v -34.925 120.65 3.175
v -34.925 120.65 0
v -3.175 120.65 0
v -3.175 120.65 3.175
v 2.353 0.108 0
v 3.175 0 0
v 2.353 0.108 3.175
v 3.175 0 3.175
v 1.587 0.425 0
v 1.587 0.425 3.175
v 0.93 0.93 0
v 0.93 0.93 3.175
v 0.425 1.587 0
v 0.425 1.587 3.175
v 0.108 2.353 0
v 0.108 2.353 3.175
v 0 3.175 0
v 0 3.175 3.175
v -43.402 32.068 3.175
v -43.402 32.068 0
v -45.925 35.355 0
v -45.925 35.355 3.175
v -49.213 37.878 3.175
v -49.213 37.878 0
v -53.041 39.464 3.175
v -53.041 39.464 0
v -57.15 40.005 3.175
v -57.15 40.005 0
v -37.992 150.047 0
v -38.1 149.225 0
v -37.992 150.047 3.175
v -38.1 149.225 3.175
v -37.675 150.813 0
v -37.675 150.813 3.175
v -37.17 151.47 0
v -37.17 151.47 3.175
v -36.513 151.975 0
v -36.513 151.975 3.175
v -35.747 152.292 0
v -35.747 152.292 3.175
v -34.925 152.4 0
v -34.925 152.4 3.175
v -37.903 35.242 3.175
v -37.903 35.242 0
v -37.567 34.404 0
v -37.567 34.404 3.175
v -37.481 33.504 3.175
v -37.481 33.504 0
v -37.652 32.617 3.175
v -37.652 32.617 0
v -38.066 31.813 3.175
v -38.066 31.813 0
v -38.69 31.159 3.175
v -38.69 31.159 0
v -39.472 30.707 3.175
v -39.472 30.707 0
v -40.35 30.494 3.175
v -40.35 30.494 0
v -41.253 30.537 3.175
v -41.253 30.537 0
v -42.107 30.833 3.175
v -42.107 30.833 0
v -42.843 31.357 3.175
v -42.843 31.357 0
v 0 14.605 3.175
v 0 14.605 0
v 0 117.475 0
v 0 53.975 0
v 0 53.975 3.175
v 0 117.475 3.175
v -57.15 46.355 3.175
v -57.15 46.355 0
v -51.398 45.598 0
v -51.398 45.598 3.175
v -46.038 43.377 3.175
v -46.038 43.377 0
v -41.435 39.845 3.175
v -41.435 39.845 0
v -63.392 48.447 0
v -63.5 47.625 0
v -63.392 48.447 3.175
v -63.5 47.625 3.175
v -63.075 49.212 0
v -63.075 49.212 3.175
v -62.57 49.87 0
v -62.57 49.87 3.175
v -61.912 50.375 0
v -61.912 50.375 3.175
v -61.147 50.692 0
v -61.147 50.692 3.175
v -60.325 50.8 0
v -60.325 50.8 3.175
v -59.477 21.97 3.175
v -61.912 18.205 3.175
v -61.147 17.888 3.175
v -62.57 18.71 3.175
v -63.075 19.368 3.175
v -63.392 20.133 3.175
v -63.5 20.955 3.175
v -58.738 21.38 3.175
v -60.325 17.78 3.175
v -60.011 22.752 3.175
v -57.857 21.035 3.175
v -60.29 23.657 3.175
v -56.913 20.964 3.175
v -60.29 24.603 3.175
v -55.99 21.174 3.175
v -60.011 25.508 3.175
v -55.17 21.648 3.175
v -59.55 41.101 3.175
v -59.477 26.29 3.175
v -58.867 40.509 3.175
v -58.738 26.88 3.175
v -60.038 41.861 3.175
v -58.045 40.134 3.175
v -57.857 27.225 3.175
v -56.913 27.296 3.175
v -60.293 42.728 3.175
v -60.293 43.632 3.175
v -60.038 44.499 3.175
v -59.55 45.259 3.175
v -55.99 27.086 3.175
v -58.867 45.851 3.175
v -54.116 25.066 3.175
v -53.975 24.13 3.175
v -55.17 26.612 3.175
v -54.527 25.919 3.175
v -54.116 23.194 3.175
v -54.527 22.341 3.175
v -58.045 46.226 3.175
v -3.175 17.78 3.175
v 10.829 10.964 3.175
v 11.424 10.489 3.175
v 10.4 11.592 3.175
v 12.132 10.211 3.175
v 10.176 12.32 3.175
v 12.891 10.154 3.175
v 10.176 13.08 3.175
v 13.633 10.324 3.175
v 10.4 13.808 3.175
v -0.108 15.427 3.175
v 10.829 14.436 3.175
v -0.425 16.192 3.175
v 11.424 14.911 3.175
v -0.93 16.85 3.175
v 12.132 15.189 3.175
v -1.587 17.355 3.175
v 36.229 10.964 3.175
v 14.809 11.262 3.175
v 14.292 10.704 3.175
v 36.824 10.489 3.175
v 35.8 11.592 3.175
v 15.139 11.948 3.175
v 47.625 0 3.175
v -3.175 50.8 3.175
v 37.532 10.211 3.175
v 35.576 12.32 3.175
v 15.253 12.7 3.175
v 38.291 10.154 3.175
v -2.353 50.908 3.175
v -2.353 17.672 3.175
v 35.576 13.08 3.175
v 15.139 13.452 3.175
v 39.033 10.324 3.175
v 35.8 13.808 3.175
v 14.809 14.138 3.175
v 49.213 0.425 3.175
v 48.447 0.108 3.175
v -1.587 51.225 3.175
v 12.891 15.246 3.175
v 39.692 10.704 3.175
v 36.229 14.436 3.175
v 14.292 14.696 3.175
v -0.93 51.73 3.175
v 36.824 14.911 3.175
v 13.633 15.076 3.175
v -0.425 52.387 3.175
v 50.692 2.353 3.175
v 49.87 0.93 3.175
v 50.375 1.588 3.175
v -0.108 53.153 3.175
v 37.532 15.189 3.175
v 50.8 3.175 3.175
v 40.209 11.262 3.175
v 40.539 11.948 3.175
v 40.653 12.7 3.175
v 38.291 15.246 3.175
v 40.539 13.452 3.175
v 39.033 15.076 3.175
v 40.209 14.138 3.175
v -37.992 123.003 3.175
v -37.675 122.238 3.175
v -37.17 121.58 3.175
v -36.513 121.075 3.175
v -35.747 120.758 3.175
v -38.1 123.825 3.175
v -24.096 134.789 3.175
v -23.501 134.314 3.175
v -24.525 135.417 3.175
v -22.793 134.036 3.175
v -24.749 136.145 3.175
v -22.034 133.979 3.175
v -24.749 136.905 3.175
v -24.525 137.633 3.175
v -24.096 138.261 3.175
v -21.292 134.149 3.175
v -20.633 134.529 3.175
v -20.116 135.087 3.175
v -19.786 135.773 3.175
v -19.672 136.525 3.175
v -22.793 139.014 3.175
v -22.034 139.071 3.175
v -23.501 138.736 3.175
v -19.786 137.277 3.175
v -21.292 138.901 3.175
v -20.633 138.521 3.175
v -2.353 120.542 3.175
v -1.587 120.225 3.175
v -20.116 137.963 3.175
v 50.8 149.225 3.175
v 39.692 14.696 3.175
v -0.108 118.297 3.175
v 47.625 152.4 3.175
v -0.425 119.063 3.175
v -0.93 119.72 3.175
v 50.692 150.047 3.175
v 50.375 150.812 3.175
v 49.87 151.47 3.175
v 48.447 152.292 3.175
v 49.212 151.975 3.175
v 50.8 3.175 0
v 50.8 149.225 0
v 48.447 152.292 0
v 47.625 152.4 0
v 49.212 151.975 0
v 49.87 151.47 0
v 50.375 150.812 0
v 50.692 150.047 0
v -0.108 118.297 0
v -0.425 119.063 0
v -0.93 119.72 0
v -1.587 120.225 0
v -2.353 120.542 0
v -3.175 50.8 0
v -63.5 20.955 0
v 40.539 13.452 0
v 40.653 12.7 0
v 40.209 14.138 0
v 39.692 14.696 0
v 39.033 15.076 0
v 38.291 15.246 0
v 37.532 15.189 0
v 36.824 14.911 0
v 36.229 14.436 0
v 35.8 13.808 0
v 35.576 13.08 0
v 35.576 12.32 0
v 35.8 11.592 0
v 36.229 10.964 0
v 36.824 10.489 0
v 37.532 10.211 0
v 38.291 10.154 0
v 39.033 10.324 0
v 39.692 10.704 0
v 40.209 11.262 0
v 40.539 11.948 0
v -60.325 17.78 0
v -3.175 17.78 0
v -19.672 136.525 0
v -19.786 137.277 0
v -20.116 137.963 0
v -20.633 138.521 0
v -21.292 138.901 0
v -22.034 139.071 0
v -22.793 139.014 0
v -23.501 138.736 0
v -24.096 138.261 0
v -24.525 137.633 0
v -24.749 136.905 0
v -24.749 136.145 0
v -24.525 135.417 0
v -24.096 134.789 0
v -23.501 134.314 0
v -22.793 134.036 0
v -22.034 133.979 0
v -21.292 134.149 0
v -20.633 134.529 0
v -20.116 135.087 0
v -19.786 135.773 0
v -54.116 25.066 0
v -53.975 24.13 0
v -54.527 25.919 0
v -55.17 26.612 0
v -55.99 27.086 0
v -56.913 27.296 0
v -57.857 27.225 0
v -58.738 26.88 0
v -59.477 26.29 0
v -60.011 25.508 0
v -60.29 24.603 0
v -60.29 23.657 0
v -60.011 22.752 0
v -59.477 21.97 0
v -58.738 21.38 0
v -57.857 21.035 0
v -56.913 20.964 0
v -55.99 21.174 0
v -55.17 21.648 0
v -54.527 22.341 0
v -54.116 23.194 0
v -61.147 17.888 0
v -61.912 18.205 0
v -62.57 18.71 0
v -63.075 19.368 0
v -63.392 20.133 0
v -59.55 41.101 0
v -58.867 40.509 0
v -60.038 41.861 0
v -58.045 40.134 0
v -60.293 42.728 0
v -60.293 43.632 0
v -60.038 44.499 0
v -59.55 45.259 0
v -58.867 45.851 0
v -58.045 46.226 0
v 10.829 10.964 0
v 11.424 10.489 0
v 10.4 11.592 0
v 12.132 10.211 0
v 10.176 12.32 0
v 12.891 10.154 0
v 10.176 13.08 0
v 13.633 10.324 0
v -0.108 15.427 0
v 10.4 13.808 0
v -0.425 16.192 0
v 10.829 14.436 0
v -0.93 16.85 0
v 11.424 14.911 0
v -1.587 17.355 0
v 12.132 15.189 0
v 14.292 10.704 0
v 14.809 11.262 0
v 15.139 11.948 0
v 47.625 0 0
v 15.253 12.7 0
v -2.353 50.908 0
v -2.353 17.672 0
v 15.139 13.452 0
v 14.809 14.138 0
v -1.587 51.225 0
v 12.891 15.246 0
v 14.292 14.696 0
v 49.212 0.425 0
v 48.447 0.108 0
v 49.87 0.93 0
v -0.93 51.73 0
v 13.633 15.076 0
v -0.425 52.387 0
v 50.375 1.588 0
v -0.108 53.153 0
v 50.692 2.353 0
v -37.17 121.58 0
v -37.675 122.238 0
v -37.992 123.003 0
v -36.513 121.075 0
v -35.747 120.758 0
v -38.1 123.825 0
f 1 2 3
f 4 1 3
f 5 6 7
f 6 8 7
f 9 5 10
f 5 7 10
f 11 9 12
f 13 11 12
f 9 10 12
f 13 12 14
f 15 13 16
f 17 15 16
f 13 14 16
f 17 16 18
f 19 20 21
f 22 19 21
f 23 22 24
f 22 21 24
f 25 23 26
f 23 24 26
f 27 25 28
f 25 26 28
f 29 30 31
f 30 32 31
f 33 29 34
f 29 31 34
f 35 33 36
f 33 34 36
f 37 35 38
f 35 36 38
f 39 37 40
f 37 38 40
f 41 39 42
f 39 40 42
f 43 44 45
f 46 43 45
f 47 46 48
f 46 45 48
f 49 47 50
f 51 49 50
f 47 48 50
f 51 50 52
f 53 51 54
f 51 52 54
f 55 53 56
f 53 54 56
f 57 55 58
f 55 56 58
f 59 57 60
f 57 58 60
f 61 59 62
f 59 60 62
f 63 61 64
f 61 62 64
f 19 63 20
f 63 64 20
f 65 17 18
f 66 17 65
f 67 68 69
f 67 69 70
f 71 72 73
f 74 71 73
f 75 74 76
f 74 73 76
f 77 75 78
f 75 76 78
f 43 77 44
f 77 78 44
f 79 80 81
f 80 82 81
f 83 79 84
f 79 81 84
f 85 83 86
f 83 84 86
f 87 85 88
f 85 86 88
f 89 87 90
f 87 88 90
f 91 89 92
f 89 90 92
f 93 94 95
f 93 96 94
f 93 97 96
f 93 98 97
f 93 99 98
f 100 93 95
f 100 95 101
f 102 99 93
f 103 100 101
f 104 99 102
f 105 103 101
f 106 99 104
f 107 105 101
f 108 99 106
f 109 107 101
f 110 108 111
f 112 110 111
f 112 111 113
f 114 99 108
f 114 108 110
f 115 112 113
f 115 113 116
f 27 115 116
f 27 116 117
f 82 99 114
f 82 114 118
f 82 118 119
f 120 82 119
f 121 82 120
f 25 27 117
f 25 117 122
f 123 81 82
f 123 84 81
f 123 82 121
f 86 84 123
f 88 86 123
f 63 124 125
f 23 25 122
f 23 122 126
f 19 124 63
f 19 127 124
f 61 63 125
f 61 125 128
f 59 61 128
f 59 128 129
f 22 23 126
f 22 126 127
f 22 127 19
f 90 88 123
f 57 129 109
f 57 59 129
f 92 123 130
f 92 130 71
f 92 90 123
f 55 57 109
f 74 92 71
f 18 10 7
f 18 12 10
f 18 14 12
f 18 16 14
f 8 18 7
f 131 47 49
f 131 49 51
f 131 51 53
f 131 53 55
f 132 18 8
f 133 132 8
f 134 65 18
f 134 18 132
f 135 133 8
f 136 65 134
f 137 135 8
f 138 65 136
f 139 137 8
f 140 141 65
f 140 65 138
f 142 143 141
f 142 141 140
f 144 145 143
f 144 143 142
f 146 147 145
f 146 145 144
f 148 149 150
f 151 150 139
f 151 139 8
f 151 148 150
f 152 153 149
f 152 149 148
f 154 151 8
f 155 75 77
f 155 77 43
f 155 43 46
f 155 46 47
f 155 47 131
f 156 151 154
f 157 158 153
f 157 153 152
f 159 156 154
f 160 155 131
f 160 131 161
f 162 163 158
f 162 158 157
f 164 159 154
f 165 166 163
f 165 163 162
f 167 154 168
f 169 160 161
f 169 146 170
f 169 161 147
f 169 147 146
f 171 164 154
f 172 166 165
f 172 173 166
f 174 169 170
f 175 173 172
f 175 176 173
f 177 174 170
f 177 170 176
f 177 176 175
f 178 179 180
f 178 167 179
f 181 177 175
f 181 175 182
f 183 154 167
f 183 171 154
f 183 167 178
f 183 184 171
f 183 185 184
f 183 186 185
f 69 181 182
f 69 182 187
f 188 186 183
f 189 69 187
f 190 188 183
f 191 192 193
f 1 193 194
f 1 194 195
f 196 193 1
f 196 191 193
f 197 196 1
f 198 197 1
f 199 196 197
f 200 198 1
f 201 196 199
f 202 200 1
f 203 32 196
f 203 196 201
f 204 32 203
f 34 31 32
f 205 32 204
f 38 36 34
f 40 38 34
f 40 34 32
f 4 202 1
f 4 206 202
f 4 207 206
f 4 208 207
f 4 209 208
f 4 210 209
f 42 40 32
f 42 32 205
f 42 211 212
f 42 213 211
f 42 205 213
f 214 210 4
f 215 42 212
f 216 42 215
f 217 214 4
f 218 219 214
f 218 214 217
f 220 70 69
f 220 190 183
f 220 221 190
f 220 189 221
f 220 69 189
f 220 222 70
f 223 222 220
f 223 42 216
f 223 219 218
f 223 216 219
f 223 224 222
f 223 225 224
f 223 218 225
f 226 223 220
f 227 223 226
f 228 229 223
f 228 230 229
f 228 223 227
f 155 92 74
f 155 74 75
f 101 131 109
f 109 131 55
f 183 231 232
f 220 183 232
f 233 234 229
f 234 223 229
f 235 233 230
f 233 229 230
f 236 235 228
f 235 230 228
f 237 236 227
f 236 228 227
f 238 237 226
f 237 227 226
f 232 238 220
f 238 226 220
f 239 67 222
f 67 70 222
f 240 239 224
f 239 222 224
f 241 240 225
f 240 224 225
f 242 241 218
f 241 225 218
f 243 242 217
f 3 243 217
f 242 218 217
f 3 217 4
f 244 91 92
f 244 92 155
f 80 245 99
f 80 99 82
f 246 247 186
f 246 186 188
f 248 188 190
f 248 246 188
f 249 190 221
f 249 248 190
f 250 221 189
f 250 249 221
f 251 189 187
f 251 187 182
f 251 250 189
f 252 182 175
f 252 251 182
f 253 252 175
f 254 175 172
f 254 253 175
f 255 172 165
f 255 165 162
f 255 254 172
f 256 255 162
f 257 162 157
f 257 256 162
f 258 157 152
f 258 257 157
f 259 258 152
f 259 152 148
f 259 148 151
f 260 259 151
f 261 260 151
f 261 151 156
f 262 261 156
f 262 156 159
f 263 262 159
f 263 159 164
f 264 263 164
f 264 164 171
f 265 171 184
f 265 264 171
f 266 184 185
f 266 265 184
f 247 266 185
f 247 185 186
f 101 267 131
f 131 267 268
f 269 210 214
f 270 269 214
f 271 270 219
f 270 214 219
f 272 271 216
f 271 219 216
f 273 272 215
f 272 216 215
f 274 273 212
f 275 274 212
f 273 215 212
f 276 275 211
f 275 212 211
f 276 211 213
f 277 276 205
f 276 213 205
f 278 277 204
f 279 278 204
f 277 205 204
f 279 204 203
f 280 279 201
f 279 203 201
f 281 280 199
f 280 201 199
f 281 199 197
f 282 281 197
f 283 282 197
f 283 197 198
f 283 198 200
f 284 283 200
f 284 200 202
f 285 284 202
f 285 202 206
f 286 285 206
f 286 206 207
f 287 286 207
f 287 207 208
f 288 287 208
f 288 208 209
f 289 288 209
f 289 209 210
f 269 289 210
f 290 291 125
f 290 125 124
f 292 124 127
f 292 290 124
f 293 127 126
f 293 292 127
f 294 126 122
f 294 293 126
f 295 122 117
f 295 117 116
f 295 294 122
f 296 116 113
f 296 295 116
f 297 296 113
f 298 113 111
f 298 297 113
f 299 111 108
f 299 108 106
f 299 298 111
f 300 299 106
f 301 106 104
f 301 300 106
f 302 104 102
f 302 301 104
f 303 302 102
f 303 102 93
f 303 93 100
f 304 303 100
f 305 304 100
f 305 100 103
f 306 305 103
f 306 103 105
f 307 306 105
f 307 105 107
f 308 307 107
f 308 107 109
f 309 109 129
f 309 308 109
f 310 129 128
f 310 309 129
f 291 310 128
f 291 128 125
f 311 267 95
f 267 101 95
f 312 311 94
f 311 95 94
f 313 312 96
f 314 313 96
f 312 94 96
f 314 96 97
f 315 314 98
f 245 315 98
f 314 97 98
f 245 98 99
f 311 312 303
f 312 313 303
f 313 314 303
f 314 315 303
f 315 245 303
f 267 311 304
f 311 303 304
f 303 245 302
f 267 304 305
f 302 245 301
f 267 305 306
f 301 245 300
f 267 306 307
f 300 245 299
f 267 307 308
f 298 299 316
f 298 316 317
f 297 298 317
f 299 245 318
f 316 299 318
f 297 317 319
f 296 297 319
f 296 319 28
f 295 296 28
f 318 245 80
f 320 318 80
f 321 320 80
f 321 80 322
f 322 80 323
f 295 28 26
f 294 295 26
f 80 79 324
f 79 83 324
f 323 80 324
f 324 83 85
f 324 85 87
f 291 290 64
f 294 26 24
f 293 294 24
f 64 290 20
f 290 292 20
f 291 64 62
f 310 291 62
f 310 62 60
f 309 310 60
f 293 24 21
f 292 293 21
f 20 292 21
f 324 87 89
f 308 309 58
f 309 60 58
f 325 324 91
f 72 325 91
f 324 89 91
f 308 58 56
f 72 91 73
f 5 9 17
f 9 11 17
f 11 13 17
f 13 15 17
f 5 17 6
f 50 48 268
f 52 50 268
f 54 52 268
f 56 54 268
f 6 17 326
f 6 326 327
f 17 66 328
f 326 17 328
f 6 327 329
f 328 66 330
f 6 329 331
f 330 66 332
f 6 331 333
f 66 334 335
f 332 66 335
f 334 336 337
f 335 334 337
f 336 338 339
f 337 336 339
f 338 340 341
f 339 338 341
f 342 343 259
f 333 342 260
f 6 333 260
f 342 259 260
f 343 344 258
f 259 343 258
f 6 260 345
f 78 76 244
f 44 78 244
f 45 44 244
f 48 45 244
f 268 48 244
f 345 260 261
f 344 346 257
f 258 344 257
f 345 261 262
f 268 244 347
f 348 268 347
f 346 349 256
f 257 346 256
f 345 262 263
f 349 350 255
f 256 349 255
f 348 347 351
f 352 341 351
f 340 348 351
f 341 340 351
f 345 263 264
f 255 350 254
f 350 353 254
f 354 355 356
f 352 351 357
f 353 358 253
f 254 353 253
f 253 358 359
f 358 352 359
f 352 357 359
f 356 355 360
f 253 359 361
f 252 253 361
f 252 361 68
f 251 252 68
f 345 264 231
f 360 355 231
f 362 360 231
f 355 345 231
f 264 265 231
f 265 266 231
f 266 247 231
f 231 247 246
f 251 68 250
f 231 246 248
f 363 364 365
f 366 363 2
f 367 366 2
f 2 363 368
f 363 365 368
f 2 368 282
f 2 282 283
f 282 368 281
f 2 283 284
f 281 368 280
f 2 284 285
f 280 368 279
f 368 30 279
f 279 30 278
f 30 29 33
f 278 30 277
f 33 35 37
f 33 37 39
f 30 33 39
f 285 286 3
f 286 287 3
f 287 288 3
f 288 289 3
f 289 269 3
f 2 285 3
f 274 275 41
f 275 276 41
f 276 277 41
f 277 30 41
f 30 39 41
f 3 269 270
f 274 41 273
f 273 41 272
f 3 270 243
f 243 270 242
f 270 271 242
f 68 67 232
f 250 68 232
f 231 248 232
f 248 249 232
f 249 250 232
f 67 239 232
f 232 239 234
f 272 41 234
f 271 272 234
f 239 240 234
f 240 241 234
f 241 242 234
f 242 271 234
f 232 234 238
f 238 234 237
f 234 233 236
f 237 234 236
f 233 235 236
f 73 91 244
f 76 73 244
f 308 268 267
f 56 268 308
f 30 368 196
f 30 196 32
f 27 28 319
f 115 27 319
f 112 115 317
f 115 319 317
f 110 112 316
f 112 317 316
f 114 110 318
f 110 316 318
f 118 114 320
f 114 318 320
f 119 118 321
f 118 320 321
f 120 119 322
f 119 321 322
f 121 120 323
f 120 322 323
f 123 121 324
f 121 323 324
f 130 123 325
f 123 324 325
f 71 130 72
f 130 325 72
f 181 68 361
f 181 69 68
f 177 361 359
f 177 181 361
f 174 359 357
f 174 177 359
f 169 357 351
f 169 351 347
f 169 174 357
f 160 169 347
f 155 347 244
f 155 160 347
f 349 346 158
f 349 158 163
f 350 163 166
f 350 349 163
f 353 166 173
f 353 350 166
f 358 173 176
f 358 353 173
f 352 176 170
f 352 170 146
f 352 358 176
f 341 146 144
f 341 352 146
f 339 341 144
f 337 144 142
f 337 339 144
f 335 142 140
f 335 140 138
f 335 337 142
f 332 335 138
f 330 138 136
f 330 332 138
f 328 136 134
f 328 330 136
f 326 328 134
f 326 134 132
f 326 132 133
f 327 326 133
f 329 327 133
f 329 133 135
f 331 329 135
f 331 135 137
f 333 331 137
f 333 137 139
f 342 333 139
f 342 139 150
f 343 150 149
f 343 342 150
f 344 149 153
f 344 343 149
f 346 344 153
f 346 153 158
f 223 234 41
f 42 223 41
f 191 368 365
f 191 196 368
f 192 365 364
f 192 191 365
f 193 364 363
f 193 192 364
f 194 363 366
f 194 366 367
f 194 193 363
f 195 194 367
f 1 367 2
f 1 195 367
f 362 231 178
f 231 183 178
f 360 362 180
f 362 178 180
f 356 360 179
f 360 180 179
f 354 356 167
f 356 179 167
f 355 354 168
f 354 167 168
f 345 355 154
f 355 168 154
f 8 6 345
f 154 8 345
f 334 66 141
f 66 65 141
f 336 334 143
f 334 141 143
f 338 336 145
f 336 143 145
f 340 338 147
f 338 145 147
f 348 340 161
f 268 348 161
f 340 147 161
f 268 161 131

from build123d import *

# Parameters (mm, degrees)
SKETCH1_R           = 3.175
SKETCH1_R_2         = 2.5527
BOSS_EXTRUDE1_DEPTH = 3.175
BOSS_EXTRUDE2_DEPTH = 3.175
FILLET1_R           = 3.175
SKETCH2_R           = 2.5527
CUT_EXTRUDE1_DEPTH  = 25.4


with BuildPart() as part:
    # Sketch1 → Boss-Extrude1 (new body)
    with BuildSketch(Plane.XY):
        Polygon((-63.5, 17.78), (0, 17.78), (0, 0), (50.8, 0), (50.8, 50.8), (-63.5, 50.8), align=None)
        with Locations((-57.15, 24.13)):
            Circle(SKETCH1_R, mode=Mode.SUBTRACT)
        with BuildLine():
            ThreePointArc((-57.15, 46.355), (-46.0375, 43.377414599), (-37.902585401, 35.2425))
            ThreePointArc((-37.902585401, 35.2425), (-39.064716058, 30.905369343), (-43.401846715, 32.0675))
            ThreePointArc((-43.401846715, 32.0675), (-49.2125, 37.878153285), (-57.15, 40.005))
            ThreePointArc((-57.15, 40.005), (-60.325, 43.18), (-57.15, 46.355))
        make_face(mode=Mode.SUBTRACT)
        with Locations((38.1, 12.7)):
            Circle(SKETCH1_R_2, mode=Mode.SUBTRACT)
        with Locations((12.7, 12.7)):
            Circle(SKETCH1_R_2, mode=Mode.SUBTRACT)
    extrude(amount=BOSS_EXTRUDE1_DEPTH)

    # Sketch1<4> → Boss-Extrude2 (add)
    with BuildSketch(Plane.XY):
        Polygon((0, 120.65), (0, 50.8), (50.8, 50.8), (50.8, 152.4), (-38.1, 152.4), (-38.1, 120.65), align=None)
    extrude(amount=BOSS_EXTRUDE2_DEPTH)

    # Fillet1
    fillet1_edges = [part.edges().sort_by_distance(p)[0] for p in [
        (50.8, 152.4, 1.5875),
        (50.8, 0, 1.5875),
        (0, 0, 1.5875),
        (0, 17.78, 1.5875),
        (-63.5, 17.78, 1.5875),
        (-63.5, 50.8, 1.5875),
        (0, 50.8, 1.5875),
        (0, 120.65, 1.5875),
        (-38.1, 120.65, 1.5875),
        (-38.1, 152.4, 1.5875),
    ]]
    fillet(fillet1_edges, radius=FILLET1_R)

    # Sketch2 → Cut-Extrude1 (cut)
    with BuildSketch(Plane.XY.offset(3.175)):
        with Locations((-22.225, 136.525)):
            Circle(SKETCH2_R)
    extrude(amount=-CUT_EXTRUDE1_DEPTH, mode=Mode.SUBTRACT)


solid = part.part
